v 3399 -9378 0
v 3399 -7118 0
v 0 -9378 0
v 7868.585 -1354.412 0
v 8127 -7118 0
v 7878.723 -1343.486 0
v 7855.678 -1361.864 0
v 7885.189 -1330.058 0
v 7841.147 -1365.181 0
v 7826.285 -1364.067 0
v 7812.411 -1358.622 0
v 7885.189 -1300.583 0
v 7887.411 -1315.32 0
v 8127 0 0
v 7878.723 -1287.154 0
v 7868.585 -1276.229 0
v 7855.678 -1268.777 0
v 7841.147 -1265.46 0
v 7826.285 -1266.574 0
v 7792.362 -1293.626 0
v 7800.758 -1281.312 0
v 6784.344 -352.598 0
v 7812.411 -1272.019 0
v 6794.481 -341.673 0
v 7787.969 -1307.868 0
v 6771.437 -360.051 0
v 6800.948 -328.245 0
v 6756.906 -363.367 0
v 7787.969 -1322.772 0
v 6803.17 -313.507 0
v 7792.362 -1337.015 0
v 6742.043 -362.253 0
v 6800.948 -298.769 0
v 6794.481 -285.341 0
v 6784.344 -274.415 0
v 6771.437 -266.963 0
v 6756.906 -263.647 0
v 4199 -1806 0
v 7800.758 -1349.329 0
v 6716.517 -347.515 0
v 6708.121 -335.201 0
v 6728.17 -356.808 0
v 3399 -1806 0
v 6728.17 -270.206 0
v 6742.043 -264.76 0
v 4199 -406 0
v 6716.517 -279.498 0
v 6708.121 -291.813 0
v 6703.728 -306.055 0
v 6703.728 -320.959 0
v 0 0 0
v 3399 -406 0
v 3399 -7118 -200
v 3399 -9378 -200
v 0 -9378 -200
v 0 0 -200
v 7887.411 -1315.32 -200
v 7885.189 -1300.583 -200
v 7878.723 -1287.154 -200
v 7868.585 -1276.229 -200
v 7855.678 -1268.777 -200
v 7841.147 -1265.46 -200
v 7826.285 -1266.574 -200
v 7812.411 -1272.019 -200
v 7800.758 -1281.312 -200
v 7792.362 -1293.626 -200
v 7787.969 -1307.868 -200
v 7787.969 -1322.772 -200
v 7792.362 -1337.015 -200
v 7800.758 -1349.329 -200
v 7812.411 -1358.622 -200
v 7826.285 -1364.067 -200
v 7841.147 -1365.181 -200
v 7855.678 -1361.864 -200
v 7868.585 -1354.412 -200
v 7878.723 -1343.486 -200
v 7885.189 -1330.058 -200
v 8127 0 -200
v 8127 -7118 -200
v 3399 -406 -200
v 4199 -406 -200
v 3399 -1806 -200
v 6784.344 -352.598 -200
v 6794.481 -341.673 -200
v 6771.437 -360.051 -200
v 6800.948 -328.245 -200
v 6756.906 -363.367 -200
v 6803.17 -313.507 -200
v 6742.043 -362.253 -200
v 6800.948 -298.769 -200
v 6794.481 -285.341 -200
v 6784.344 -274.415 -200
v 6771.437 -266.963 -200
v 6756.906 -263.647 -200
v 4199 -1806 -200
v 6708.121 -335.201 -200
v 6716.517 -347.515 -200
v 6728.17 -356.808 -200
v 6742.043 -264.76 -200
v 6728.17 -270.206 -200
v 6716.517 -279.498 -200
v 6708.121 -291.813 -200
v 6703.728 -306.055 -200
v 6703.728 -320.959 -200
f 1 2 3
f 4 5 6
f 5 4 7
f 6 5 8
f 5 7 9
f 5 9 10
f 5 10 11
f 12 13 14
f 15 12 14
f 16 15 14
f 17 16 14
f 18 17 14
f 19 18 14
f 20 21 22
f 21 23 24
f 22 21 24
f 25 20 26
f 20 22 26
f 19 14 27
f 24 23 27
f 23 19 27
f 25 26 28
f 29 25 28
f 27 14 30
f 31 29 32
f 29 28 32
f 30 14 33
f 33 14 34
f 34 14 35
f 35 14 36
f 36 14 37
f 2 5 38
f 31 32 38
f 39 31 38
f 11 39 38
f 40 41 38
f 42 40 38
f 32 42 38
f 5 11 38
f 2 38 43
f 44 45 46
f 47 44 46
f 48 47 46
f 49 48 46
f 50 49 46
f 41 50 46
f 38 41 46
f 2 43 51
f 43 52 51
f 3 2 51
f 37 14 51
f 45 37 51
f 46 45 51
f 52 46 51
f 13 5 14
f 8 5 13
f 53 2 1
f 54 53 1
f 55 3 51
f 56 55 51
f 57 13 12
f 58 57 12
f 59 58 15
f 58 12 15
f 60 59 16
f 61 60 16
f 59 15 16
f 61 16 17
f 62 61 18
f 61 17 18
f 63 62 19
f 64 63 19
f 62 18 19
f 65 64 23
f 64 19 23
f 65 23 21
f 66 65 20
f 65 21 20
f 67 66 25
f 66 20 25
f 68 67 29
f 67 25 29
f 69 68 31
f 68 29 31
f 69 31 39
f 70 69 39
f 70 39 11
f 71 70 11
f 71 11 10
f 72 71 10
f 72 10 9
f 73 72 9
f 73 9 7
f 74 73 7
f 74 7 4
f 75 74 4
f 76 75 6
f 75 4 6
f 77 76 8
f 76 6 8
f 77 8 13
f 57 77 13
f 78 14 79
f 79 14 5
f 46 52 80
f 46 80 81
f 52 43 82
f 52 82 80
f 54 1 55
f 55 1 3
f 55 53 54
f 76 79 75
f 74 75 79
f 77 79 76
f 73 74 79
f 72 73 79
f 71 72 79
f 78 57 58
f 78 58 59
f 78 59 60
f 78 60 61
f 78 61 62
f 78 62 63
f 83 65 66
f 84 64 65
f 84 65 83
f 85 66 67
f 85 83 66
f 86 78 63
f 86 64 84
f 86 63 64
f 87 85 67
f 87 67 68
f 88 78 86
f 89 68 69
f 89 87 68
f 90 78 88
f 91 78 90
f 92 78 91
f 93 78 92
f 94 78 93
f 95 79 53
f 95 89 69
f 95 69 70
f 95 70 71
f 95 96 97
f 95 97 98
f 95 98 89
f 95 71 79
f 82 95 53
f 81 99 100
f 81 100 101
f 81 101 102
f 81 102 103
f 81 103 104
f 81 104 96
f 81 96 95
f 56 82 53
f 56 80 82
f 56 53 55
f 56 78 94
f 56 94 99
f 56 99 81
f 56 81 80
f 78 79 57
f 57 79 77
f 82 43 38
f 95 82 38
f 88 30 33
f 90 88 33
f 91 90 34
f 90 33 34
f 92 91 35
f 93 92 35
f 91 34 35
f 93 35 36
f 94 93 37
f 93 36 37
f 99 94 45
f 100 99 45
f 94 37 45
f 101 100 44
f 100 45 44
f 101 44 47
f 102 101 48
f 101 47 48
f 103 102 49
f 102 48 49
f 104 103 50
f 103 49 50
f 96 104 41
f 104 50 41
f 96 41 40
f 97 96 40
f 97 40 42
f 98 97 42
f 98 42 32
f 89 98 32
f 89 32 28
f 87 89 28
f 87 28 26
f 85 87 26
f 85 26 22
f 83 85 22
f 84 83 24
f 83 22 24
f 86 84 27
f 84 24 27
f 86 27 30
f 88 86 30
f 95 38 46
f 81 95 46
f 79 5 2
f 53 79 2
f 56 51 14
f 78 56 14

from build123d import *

# Parameters (mm, degrees)
SKETCH_1_R      = 50
SKETCH_1_W      = 800
SKETCH_1_H      = 1400
EXTRUDE_1_DEPTH = 200


with BuildPart() as part:
    # Эскиз1 → Бобышка-Вытянуть1 (new body)
    with BuildSketch(Plane.XY):
        Polygon((0, 0), (8127, 0), (8127, -7118), (3399, -7118), (3399, -9378), (0, -9378), align=None)
        with Locations((7837.410737103, -1315.320353334)):
            Circle(SKETCH_1_R, mode=Mode.SUBTRACT)
        with Locations((6753.169536369, -313.506846223)):
            Circle(SKETCH_1_R, mode=Mode.SUBTRACT)
        with Locations((3799, -1106)):
            Rectangle(SKETCH_1_W, SKETCH_1_H, mode=Mode.SUBTRACT)
    extrude(amount=-EXTRUDE_1_DEPTH)


solid = part.part
